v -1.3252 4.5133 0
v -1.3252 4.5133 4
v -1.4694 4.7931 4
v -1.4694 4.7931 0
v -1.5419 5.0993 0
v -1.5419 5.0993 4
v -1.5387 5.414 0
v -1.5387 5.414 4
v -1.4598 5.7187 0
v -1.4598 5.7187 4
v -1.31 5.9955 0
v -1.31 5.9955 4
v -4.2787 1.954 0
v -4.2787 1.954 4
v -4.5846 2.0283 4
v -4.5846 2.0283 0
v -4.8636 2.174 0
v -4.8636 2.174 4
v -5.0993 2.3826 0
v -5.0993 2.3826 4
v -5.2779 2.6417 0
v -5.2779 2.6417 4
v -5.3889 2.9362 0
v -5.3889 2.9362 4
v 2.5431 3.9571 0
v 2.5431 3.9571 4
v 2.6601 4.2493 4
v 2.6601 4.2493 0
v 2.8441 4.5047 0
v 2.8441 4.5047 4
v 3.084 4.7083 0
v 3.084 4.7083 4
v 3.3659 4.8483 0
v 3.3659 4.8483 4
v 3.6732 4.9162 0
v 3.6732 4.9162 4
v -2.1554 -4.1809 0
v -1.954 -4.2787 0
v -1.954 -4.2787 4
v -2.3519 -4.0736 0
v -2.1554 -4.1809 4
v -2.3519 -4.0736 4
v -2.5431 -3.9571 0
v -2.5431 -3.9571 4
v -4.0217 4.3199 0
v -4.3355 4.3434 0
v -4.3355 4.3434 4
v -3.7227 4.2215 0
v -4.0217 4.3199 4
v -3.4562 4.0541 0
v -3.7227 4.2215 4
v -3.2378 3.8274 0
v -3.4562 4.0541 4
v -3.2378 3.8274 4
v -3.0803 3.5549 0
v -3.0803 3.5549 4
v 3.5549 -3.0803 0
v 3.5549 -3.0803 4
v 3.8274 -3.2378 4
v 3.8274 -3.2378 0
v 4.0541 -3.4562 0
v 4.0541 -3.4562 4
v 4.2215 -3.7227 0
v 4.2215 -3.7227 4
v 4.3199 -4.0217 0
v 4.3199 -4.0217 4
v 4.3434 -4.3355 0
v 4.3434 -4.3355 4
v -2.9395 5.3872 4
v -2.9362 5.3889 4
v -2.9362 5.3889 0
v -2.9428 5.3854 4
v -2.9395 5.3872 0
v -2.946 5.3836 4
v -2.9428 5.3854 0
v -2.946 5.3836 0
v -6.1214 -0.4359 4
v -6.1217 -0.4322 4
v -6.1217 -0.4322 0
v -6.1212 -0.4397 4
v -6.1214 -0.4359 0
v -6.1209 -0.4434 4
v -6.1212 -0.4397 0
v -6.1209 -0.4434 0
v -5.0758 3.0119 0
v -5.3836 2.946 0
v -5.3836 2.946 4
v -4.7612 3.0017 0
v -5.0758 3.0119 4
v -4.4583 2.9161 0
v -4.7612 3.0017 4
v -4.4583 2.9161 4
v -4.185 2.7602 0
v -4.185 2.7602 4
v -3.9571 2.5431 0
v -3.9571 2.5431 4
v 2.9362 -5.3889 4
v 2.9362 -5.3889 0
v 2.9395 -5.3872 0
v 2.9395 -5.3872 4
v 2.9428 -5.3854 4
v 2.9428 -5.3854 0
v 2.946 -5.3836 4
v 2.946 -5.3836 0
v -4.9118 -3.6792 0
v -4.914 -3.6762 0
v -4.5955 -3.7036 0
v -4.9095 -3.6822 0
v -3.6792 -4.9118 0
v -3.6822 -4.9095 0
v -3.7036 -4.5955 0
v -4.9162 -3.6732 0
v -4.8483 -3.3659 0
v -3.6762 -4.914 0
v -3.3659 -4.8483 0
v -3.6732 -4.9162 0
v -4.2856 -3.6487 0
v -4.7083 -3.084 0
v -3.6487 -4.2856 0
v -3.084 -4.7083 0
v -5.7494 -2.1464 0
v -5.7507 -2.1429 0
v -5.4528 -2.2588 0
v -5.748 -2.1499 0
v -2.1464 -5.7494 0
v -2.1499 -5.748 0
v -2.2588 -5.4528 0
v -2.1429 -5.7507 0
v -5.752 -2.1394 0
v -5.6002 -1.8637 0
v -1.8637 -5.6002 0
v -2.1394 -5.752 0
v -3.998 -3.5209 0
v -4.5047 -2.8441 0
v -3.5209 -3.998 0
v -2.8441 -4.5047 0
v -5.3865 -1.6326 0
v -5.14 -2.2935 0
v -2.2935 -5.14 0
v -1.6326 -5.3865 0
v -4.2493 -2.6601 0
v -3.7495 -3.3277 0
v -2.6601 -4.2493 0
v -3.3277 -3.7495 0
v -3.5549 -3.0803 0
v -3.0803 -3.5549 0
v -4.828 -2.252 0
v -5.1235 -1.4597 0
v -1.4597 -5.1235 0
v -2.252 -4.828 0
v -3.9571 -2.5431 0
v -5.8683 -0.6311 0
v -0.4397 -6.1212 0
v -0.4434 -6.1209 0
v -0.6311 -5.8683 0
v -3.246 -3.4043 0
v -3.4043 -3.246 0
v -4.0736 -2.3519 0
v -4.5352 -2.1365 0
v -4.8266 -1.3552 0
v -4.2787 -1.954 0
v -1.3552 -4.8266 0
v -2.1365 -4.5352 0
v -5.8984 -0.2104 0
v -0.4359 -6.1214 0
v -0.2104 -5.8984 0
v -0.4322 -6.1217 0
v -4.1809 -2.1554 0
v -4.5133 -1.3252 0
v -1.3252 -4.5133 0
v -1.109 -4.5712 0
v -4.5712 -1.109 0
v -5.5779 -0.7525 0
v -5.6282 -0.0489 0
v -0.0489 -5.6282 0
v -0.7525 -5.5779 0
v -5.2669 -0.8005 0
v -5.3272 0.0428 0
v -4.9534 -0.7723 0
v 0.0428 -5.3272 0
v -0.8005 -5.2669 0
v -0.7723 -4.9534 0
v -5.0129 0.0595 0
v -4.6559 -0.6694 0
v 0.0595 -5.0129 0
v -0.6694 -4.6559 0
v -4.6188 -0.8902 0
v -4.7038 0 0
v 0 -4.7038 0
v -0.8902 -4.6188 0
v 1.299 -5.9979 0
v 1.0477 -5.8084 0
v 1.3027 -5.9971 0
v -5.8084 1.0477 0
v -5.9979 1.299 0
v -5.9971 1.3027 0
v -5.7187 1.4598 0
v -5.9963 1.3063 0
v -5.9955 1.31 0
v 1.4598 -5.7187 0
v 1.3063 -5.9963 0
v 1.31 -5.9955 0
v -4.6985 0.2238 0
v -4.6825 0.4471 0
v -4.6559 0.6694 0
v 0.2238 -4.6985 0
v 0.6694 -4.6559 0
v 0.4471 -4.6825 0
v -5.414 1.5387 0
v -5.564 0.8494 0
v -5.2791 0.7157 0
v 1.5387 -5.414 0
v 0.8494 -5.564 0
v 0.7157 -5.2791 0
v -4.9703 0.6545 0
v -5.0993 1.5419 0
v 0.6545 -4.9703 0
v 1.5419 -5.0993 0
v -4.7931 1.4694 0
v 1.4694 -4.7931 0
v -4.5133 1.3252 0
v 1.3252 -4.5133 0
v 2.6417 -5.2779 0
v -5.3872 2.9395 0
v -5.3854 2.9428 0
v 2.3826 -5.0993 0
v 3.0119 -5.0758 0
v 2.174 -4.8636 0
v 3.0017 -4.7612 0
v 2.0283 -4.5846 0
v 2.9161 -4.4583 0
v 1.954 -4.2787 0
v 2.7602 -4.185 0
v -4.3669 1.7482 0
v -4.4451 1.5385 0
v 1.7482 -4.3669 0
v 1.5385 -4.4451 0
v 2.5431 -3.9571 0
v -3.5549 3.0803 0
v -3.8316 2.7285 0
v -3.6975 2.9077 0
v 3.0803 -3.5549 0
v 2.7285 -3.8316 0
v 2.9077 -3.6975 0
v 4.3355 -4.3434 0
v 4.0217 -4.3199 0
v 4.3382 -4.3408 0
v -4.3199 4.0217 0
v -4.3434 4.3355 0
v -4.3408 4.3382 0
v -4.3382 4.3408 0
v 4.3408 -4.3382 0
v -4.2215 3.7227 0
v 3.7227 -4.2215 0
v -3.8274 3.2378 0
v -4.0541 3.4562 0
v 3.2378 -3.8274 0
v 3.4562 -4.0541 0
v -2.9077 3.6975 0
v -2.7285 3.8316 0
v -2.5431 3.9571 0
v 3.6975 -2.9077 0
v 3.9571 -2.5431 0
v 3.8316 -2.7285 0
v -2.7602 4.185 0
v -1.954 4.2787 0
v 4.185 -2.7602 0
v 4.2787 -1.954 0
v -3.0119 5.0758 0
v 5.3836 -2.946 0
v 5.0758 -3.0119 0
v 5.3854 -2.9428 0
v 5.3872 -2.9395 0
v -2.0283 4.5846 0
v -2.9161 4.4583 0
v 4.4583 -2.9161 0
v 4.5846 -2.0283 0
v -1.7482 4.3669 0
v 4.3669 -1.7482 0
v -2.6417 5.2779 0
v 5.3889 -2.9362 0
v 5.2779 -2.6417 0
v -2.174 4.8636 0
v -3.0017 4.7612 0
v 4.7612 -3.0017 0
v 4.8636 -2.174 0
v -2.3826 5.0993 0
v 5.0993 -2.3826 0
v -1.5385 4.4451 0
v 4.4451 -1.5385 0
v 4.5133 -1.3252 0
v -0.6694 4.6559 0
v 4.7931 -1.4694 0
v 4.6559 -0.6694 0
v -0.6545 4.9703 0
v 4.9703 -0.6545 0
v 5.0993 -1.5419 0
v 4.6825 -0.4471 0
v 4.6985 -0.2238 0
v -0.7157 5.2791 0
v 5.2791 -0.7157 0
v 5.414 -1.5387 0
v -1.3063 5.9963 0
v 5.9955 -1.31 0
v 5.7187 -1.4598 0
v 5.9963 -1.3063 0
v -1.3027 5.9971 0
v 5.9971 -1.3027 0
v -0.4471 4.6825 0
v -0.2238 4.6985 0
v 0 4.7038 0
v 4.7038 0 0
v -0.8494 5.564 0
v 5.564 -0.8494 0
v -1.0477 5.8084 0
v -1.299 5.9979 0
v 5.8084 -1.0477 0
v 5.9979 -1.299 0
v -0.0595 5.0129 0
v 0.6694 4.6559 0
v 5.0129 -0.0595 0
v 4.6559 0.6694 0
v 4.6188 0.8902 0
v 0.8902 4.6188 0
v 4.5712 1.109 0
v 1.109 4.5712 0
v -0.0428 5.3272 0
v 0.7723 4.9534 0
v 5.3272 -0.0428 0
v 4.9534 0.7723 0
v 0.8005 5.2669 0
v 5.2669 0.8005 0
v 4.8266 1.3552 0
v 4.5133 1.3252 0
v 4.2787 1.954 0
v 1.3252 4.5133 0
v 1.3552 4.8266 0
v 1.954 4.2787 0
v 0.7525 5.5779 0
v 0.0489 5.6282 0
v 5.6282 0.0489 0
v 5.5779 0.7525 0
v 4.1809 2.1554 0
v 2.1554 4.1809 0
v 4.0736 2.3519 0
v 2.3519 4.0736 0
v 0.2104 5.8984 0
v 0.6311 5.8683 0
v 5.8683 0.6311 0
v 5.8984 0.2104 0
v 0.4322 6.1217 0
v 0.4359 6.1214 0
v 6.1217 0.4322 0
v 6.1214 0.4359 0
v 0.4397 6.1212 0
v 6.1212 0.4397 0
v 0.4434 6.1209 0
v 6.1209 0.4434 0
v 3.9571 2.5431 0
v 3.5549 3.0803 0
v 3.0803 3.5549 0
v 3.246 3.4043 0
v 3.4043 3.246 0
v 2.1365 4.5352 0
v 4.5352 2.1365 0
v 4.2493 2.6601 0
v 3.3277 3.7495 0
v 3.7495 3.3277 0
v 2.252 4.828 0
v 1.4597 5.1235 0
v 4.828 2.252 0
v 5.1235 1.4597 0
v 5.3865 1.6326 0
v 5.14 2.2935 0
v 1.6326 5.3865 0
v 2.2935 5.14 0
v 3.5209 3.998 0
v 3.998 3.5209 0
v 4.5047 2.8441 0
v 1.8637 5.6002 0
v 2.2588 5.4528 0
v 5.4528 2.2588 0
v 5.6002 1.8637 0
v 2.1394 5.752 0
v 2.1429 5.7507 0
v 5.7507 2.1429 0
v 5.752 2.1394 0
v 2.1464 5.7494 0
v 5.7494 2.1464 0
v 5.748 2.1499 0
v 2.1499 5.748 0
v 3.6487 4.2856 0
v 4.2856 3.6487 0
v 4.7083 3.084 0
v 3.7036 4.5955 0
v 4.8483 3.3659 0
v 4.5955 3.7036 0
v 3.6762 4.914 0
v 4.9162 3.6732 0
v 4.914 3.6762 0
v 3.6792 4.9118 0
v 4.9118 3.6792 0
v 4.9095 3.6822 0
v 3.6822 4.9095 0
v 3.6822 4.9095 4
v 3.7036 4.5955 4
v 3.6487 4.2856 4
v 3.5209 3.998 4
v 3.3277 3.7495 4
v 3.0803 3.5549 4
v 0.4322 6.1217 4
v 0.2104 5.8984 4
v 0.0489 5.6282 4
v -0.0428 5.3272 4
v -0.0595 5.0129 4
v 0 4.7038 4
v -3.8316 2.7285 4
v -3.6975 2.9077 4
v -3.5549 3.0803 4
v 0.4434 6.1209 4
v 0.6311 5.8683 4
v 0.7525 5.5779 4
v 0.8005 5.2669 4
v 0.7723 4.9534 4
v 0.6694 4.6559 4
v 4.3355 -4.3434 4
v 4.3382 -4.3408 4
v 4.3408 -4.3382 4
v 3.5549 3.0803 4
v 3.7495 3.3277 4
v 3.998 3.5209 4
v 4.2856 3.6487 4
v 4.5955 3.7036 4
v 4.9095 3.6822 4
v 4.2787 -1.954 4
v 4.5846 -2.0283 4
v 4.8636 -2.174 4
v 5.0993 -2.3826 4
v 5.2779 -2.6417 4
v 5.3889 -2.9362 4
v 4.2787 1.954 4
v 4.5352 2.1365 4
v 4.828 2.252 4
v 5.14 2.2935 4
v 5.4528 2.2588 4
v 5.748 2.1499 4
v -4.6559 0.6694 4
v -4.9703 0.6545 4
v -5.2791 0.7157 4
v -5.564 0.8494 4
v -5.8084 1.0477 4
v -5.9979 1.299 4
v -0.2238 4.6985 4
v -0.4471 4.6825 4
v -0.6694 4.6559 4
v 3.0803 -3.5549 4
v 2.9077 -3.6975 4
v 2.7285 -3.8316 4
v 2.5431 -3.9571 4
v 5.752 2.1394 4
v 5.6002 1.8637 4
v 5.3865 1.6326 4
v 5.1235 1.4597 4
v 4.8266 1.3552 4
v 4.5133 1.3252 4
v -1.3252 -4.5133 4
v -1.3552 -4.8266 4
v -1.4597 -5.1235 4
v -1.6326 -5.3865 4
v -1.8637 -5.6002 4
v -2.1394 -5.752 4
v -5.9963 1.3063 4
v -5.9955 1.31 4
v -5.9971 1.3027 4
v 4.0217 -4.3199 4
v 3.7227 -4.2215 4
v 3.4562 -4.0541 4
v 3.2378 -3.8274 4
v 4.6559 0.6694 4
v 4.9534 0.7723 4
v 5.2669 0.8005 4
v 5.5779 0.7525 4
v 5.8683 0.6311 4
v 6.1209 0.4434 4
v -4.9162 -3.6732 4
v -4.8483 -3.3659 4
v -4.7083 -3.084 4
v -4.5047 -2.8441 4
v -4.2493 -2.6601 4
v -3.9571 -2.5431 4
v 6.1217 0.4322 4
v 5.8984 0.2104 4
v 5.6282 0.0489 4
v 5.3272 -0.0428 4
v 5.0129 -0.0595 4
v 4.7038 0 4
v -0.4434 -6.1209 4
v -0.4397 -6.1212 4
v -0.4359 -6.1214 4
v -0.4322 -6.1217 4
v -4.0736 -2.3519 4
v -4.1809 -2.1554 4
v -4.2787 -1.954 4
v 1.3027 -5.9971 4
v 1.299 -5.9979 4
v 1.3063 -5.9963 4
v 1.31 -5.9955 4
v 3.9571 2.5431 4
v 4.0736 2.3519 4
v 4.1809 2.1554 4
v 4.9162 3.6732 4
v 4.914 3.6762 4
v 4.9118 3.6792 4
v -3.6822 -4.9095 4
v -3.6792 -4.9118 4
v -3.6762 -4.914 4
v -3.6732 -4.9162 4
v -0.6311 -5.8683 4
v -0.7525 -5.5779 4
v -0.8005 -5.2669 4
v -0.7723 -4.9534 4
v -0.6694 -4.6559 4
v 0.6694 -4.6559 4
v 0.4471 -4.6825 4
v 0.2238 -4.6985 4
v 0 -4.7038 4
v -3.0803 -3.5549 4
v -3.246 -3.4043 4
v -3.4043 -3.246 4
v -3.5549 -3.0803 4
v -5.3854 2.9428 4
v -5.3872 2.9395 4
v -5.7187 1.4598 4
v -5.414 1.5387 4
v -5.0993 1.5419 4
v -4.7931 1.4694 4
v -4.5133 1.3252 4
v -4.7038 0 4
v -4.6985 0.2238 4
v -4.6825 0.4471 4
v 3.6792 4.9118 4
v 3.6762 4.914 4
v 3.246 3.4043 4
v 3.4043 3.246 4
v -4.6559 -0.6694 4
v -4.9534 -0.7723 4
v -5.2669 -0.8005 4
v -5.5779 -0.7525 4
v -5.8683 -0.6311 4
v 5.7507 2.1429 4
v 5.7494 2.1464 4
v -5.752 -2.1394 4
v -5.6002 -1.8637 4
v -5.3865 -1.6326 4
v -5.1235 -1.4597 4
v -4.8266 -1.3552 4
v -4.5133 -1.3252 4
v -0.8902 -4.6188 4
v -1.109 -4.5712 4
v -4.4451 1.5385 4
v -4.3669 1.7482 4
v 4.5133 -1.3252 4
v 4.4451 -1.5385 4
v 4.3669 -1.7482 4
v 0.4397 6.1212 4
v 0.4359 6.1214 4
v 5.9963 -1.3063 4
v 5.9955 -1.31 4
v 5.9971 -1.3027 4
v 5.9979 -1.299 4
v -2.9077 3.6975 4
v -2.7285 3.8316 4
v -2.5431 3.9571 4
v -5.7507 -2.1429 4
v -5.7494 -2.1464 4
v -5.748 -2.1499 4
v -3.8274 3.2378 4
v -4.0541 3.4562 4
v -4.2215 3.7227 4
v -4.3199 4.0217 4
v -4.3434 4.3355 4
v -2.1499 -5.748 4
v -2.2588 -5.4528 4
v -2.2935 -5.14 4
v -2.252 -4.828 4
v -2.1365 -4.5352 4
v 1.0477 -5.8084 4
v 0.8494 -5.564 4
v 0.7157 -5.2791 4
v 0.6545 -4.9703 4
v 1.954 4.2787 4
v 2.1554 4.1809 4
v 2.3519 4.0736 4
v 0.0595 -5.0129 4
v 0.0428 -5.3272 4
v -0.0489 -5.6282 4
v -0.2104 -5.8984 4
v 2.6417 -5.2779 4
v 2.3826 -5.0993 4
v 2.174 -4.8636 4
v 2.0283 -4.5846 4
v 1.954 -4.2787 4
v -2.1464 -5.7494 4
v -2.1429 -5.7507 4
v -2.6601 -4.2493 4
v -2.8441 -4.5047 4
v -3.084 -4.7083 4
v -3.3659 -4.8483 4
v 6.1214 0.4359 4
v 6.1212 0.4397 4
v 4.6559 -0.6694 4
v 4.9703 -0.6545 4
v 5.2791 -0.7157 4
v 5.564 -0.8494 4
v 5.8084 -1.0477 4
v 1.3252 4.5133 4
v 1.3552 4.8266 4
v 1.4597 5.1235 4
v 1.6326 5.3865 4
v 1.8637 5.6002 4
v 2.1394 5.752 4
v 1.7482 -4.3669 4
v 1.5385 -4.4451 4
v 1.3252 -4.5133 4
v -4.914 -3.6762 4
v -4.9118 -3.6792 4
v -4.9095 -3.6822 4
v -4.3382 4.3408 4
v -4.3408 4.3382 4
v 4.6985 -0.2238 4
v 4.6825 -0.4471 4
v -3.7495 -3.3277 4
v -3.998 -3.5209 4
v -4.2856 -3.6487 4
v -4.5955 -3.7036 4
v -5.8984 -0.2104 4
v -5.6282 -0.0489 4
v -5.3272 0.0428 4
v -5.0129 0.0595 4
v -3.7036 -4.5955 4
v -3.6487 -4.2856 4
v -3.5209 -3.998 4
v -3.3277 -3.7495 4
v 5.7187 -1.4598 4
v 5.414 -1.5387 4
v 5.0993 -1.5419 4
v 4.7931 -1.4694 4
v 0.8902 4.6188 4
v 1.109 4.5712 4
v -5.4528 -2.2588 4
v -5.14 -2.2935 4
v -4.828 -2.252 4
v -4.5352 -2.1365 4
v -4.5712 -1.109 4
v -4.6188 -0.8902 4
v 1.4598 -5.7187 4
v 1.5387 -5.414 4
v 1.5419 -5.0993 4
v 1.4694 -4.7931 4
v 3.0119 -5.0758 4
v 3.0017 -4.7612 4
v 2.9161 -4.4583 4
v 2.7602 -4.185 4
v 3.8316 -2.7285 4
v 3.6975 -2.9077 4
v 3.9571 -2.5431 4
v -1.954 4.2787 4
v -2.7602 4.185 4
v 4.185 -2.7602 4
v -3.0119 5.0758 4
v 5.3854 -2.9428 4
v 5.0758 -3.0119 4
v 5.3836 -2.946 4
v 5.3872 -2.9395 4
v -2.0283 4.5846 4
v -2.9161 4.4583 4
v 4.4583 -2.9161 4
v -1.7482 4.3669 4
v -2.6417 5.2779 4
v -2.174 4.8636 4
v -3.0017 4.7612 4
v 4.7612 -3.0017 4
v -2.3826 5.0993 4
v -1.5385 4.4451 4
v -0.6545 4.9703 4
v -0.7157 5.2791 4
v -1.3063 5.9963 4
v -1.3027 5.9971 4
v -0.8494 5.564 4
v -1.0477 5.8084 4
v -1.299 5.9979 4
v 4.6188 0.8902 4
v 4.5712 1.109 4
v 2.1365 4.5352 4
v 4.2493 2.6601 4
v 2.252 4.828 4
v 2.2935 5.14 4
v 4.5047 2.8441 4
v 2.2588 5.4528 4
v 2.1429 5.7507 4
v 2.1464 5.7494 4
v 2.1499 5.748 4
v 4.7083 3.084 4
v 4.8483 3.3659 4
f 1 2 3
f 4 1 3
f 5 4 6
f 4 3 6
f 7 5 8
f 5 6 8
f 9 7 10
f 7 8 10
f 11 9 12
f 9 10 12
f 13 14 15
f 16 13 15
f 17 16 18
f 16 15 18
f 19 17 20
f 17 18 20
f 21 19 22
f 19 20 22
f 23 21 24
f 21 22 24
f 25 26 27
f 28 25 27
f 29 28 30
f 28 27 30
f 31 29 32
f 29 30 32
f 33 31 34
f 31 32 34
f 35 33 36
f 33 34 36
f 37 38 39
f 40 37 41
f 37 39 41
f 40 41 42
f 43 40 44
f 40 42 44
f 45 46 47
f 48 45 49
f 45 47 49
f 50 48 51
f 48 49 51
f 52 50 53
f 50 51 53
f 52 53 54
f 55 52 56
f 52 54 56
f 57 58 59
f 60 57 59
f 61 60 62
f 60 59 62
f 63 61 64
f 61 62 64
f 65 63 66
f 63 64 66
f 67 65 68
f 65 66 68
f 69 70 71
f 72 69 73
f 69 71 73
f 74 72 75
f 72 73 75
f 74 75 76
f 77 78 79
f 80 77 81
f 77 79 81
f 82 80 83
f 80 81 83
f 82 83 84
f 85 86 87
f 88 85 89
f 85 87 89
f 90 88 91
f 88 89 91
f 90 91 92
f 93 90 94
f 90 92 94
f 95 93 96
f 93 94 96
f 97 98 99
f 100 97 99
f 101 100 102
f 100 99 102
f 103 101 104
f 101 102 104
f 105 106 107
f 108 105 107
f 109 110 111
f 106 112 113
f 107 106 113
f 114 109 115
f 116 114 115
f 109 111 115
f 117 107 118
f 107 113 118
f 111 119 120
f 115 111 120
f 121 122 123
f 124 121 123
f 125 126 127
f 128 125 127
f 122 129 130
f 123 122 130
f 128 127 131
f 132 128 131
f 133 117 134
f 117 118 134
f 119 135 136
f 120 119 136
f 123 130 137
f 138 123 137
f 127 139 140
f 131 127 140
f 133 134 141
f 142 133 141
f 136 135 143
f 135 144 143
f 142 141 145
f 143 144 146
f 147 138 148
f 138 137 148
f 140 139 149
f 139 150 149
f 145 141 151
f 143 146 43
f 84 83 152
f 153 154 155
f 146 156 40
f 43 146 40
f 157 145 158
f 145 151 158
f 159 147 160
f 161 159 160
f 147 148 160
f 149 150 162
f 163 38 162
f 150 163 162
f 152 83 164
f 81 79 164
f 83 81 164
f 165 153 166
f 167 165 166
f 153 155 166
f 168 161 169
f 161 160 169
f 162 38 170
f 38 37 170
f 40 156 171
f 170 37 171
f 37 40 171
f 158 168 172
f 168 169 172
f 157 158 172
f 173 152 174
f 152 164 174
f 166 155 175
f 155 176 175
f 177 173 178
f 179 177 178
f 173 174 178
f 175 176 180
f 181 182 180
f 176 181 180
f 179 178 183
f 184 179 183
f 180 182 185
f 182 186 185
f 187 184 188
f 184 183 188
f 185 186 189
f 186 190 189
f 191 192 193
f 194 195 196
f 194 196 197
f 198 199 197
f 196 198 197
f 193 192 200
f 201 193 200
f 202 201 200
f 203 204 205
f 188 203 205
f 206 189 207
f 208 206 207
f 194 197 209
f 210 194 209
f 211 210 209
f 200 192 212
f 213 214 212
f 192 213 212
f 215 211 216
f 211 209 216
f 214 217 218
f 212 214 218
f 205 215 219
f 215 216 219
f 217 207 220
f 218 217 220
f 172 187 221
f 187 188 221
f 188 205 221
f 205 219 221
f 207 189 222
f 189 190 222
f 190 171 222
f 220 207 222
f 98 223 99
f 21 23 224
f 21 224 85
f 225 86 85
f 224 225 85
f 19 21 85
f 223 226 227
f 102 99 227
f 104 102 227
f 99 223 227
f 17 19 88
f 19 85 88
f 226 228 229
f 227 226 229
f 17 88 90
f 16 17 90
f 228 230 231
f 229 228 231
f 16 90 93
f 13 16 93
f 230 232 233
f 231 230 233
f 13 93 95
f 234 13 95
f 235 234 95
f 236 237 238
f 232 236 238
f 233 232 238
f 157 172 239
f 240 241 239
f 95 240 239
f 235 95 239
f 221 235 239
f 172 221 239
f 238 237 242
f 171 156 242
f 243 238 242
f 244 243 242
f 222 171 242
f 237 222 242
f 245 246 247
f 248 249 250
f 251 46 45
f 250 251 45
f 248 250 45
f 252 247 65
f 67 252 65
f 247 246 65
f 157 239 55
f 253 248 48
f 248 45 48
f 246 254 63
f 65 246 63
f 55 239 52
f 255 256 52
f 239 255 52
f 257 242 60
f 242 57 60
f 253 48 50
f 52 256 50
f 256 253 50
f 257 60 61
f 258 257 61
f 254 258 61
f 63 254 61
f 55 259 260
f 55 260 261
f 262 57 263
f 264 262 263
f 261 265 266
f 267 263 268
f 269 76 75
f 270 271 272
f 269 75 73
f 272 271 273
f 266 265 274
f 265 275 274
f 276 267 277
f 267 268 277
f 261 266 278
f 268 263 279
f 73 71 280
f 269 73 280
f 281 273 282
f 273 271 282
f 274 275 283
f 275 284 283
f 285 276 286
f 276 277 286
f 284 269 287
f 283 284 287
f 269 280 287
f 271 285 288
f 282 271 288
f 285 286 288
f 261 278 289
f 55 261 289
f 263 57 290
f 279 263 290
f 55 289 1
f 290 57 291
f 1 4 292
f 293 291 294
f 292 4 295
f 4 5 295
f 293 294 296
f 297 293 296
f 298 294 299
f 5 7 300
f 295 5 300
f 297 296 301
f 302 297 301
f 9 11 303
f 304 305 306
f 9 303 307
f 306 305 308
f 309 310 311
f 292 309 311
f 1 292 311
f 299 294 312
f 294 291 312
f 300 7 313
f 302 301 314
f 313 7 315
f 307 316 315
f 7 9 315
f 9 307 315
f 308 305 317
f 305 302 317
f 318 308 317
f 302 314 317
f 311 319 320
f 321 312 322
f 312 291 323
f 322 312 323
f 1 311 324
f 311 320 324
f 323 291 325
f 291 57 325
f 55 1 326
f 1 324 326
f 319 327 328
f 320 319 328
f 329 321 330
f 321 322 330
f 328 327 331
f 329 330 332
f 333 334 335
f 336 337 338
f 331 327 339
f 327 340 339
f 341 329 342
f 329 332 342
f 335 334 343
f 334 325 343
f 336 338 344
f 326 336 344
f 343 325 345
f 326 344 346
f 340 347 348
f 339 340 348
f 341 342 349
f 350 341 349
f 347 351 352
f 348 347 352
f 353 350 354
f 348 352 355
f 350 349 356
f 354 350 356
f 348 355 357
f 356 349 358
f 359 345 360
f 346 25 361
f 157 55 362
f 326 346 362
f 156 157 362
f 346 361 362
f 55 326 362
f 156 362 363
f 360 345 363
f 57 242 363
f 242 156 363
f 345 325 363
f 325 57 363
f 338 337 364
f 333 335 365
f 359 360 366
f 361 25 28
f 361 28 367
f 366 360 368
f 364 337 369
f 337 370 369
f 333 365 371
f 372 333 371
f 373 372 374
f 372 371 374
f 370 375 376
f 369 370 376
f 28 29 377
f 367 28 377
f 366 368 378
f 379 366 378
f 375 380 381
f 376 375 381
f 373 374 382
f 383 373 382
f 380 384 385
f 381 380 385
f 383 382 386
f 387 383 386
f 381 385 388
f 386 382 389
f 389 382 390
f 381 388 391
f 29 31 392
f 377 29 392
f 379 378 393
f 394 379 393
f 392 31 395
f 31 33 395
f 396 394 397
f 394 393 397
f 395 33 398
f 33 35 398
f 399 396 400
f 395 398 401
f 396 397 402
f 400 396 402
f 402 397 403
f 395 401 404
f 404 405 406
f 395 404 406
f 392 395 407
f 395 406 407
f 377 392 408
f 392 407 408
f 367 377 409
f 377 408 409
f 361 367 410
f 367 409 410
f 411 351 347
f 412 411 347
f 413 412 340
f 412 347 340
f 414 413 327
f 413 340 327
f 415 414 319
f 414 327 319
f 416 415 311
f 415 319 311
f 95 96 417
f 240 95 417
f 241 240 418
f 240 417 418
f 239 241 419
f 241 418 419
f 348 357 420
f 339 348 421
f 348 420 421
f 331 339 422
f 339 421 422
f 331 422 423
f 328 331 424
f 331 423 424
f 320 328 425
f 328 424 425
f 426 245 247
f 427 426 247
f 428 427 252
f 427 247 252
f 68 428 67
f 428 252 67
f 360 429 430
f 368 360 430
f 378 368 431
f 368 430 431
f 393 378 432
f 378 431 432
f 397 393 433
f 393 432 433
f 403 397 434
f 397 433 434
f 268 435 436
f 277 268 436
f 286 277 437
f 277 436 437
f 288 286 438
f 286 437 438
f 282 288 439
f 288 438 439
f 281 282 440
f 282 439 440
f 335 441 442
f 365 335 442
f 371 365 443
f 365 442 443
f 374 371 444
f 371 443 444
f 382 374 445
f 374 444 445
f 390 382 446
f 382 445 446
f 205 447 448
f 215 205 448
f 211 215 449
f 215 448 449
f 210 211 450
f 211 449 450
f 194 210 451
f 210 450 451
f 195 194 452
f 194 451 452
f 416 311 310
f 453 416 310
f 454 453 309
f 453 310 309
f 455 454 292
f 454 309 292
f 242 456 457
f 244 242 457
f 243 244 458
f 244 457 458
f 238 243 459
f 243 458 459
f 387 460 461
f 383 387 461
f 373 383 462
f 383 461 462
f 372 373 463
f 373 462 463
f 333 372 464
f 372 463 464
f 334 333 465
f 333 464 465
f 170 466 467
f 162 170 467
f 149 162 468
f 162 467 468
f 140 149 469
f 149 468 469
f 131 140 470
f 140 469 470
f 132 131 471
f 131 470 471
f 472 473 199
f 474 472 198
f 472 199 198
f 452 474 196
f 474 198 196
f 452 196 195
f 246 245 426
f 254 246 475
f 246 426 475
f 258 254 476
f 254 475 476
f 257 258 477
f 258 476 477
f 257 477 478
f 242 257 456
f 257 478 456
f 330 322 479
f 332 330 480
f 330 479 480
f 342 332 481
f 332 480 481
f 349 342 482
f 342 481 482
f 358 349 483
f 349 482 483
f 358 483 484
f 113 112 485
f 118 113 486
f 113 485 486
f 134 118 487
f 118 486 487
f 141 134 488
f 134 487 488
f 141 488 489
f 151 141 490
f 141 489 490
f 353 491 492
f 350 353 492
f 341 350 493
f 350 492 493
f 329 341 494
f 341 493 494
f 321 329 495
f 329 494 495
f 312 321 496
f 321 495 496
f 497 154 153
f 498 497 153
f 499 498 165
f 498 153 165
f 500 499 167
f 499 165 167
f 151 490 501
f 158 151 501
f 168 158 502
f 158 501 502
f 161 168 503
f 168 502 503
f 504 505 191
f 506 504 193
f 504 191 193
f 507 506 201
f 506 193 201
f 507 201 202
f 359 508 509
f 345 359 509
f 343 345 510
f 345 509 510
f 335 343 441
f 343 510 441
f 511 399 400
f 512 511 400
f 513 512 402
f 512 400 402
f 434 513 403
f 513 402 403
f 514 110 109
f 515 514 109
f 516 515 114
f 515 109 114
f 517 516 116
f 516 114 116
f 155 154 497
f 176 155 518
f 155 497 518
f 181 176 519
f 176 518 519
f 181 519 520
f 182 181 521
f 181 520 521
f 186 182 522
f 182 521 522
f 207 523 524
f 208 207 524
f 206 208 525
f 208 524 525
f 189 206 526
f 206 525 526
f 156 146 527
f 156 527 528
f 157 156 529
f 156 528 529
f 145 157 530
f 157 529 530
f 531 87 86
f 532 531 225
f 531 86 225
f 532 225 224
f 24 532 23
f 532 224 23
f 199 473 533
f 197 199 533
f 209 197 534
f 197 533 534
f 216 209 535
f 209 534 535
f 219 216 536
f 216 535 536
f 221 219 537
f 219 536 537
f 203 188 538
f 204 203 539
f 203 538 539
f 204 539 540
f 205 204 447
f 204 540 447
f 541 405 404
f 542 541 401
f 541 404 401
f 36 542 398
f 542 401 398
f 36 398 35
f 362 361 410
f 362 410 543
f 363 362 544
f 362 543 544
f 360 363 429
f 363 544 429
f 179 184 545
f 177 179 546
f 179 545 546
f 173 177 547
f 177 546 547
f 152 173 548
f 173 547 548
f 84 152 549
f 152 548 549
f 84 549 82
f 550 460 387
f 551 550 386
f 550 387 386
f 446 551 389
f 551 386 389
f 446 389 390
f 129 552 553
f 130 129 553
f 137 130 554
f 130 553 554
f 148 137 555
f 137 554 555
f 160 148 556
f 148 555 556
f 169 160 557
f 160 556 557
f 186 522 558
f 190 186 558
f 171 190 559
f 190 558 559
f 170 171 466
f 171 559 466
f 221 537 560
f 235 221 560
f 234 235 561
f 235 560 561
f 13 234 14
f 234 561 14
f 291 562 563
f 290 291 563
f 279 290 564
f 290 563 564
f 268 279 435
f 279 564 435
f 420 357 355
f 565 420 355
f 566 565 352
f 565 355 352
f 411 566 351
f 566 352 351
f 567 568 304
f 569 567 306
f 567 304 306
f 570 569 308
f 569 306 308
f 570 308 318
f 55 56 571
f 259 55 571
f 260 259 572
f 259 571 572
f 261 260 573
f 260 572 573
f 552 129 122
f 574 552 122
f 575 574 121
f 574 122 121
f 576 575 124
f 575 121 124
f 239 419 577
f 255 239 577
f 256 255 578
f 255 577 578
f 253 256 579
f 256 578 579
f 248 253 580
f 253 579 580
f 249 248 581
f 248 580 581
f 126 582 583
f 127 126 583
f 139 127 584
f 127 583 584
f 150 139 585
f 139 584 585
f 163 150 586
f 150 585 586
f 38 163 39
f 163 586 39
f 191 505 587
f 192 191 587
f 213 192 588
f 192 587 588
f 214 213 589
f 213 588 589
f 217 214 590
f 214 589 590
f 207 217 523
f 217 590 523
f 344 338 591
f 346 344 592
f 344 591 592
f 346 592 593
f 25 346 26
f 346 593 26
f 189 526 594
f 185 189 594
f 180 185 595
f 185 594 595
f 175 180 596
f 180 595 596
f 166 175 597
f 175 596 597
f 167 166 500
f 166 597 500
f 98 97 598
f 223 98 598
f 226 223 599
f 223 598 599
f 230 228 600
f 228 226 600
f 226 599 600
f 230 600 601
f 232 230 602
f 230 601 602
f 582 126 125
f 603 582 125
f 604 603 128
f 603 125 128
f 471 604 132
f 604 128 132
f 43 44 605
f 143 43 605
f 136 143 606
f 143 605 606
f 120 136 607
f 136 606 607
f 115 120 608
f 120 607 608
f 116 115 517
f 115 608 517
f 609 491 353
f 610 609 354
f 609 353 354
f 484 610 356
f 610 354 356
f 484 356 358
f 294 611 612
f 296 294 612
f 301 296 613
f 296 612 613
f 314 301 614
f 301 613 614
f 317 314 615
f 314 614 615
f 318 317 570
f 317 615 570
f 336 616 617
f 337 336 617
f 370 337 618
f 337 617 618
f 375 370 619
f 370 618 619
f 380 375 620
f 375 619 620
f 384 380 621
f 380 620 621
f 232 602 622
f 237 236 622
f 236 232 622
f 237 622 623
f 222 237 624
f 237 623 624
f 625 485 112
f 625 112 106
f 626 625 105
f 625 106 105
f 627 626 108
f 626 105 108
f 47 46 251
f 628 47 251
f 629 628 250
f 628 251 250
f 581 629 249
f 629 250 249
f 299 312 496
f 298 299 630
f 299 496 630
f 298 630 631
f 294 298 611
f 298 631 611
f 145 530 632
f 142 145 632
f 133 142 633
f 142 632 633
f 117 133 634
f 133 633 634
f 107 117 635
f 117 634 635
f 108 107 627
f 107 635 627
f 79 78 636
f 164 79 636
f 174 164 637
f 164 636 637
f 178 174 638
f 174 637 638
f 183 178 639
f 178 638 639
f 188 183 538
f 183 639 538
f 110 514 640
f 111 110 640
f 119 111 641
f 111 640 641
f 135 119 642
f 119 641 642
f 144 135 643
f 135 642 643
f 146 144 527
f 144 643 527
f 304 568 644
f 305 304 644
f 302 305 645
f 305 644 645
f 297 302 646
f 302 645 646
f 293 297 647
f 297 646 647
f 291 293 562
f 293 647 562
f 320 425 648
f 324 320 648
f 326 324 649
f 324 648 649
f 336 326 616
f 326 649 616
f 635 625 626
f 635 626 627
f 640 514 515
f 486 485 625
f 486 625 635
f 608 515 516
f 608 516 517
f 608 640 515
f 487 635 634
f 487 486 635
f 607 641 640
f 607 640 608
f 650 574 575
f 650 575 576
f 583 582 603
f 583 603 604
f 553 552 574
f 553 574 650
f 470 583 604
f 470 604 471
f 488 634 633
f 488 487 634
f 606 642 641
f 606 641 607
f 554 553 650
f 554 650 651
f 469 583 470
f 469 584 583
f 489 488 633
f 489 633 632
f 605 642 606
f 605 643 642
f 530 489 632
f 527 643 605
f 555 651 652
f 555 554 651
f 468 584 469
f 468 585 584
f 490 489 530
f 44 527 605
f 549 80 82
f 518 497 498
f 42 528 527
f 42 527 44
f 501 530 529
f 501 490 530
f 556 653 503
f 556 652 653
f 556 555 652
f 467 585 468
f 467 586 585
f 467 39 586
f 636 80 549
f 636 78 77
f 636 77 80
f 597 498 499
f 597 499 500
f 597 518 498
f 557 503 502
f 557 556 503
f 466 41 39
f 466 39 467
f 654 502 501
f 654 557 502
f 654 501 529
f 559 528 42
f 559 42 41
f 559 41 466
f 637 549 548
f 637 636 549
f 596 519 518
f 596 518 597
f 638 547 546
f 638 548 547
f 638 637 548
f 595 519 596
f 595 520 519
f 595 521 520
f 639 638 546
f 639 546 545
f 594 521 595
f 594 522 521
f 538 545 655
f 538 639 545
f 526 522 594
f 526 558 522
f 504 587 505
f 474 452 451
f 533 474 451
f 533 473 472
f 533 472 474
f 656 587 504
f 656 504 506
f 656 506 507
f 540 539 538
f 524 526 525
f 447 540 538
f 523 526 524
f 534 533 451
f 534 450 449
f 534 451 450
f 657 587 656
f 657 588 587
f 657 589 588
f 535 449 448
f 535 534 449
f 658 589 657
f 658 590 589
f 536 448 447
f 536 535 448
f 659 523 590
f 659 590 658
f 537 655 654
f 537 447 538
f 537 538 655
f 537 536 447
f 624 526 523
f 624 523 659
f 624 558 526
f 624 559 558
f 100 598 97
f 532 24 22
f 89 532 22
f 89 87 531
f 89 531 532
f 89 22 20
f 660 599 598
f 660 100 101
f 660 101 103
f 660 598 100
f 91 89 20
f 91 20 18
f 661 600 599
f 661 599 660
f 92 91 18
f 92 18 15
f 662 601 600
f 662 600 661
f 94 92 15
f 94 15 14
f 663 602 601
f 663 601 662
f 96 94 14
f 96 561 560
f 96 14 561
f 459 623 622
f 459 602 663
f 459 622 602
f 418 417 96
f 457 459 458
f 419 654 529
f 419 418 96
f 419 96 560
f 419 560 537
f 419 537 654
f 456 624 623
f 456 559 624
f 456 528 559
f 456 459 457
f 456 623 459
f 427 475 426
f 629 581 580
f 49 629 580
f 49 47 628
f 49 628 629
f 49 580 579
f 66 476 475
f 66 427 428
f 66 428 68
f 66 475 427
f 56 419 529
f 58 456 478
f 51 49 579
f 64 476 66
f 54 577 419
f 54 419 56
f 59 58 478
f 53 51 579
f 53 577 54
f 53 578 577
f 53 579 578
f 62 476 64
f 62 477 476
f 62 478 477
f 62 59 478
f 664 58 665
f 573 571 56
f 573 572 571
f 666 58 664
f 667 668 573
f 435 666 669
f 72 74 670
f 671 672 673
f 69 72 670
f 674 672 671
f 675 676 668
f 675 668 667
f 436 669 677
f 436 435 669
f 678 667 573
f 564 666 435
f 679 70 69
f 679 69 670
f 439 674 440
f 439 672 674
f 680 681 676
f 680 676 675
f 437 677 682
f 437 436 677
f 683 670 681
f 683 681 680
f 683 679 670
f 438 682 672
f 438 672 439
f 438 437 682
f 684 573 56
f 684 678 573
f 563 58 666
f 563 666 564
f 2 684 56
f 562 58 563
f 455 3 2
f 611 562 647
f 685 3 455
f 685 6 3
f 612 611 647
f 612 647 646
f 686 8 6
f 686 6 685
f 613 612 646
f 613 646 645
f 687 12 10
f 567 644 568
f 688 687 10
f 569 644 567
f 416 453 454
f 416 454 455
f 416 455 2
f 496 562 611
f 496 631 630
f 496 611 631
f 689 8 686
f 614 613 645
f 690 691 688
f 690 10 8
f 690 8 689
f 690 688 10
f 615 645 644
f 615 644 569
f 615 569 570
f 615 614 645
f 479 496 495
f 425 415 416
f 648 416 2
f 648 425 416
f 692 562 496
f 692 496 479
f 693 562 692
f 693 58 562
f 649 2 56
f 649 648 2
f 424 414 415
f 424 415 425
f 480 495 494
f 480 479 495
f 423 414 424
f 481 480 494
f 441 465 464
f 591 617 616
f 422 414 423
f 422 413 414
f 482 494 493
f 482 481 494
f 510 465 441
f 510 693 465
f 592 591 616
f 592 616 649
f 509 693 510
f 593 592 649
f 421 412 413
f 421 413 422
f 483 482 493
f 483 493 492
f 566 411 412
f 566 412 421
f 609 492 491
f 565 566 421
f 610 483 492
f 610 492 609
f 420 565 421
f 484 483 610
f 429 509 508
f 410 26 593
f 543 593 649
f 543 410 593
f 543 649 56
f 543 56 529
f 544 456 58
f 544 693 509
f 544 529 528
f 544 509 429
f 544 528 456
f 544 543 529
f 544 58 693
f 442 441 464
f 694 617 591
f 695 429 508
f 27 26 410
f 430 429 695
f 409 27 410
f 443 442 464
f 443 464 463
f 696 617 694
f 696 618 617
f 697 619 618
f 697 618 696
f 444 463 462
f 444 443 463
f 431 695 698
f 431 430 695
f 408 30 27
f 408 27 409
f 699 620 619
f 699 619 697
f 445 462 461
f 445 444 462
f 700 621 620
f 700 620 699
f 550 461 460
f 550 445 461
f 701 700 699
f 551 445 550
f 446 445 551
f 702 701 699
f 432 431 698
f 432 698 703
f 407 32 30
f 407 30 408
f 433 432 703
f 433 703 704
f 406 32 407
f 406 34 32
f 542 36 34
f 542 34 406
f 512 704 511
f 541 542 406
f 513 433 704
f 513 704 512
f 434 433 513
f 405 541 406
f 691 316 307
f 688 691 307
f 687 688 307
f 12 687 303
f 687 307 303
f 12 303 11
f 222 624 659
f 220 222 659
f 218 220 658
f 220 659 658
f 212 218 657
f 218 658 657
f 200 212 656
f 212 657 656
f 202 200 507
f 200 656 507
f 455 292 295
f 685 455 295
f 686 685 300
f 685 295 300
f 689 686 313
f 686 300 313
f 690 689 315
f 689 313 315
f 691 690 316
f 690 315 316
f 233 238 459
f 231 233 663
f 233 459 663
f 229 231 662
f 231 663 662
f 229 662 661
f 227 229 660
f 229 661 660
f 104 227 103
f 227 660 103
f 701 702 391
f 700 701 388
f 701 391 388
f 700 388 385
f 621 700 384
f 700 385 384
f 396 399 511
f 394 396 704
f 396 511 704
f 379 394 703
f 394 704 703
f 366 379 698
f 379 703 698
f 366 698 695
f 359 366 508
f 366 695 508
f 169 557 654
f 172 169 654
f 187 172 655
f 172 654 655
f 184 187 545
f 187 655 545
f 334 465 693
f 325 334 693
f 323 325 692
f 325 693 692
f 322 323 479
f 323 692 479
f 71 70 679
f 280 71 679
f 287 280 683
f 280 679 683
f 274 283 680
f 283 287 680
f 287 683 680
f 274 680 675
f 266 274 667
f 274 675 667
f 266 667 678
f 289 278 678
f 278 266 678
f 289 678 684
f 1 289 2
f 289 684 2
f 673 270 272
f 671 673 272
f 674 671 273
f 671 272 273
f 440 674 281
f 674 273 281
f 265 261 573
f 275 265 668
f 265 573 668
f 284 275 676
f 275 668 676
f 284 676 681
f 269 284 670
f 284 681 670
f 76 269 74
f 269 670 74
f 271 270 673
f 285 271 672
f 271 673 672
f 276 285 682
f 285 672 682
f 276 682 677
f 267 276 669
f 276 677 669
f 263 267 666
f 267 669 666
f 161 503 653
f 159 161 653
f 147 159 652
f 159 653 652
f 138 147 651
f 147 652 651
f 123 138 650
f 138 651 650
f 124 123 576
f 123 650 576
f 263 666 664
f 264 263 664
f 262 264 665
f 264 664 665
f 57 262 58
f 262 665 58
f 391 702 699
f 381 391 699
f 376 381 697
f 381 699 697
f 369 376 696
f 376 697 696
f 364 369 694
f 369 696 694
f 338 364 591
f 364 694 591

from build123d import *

# Parameters (mm, degrees)
BOSS_EXTRUDE1_DEPTH = 4
CUT_EXTRUDE1_DEPTH  = 10


with BuildPart() as part:
    # Sketch1 → Boss-Extrude1 (new body)
    with BuildSketch(Plane.XY):
        with BuildLine():
            ThreePointArc((0.432215106, 6.121703644), (-0.006111672, 5.480502071), (0, 4.703821656))
            ThreePointArc((0, 4.703821656), (-0.335566795, 4.691836858), (-0.669423618, 4.655943534))
            ThreePointArc((-0.669423618, 4.655943534), (-0.773907302, 5.425588244), (-1.299025043, 5.997882904))
            ThreePointArc((-1.299025043, 5.997882904), (0.437804478, -6.121306449), (0.432215106, 6.121703644))
        make_face()
    extrude(amount=BOSS_EXTRUDE1_DEPTH)

    # Sketch2 → Cut-Extrude1 (cut)
    with BuildSketch(Plane.XY.offset(4)):
        with BuildLine():
            ThreePointArc((-3.554911214, 3.080348102), (-4.145889401, 3.584346716), (-4.343434222, 4.335509723))
            ThreePointArc((-4.343434222, 4.335509723), (-4.912875705, 3.677732686), (-5.383577945, 2.946040378))
            ThreePointArc((-5.383577945, 2.946040378), (-4.60718751, 2.968124585), (-3.957106586, 2.543077985))
            ThreePointArc((-3.957106586, 2.543077985), (-3.765603226, 2.818895266), (-3.554911214, 3.080348102))
        make_face()
        with BuildLine():
            ThreePointArc((-2.543077985, 3.957106586), (-2.968124585, 4.60718751), (-2.946040378, 5.383577945))
            ThreePointArc((-2.946040378, 5.383577945), (-3.677732686, 4.912875705), (-4.335509723, 4.343434222))
            ThreePointArc((-4.335509723, 4.343434222), (-3.584346716, 4.145889401), (-3.080348102, 3.554911214))
            ThreePointArc((-3.080348102, 3.554911214), (-2.818895266, 3.765603226), (-2.543077985, 3.957106586))
        make_face()
        with BuildLine():
            ThreePointArc((-1.325219702, 4.513283828), (-1.549899967, 5.256781372), (-1.309975863, 5.995500699))
            ThreePointArc((-1.309975863, 5.995500699), (-2.144641637, 5.750006752), (-2.936204288, 5.388948857))
            ThreePointArc((-2.936204288, 5.388948857), (-2.271123467, 4.987778915), (-1.954038134, 4.278746679))
            ThreePointArc((-1.954038134, 4.278746679), (-1.643817176, 4.407244407), (-1.325219702, 4.513283828))
        make_face()
        with BuildLine():
            ThreePointArc((2.139390577, 5.751962566), (1.304500997, 5.996694302), (0.443393485, 6.12090415))
            ThreePointArc((0.443393485, 6.12090415), (0.78600623, 5.423848681), (0.669423618, 4.655943534))
            ThreePointArc((0.669423618, 4.655943534), (0.999869212, 4.596324589), (1.325219702, 4.513283828))
            ThreePointArc((1.325219702, 4.513283828), (1.538171755, 5.260225086), (2.139390577, 5.751962566))
        make_face()
        with BuildLine():
            ThreePointArc((3.673245347, 4.916231689), (2.941123559, 5.386265646), (2.14989091, 5.748046144))
            ThreePointArc((2.14989091, 5.748046144), (2.282242211, 4.982701155), (1.954038134, 4.278746679))
            ThreePointArc((1.954038134, 4.278746679), (2.254301762, 4.128445438), (2.543077985, 3.957106586))
            ThreePointArc((2.543077985, 3.957106586), (2.957841655, 4.613795948), (3.673245347, 4.916231689))
        make_face()
        with BuildLine():
            ThreePointArc((4.909515624, 3.682216959), (4.339473781, 4.339473781), (3.682216959, 4.909515624))
            ThreePointArc((3.682216959, 4.909515624), (3.593584502, 4.137884814), (3.080348102, 3.554911214))
            ThreePointArc((3.080348102, 3.554911214), (3.32610419, 3.32610419), (3.554911214, 3.080348102))
            ThreePointArc((3.554911214, 3.080348102), (4.137884814, 3.593584502), (4.909515624, 3.682216959))
        make_face()
        with BuildLine():
            ThreePointArc((5.748046144, 2.14989091), (5.386265646, 2.941123559), (4.916231689, 3.673245347))
            ThreePointArc((4.916231689, 3.673245347), (4.613795948, 2.957841655), (3.957106586, 2.543077985))
            ThreePointArc((3.957106586, 2.543077985), (4.128445438, 2.254301762), (4.278746679, 1.954038134))
            ThreePointArc((4.278746679, 1.954038134), (4.982701155, 2.282242211), (5.748046144, 2.14989091))
        make_face()
        with BuildLine():
            ThreePointArc((6.12090415, 0.443393485), (5.996694302, 1.304500997), (5.751962566, 2.139390577))
            ThreePointArc((5.751962566, 2.139390577), (5.260225086, 1.538171755), (4.513283828, 1.325219702))
            ThreePointArc((4.513283828, 1.325219702), (4.596324589, 0.999869212), (4.655943534, 0.669423618))
            ThreePointArc((4.655943534, 0.669423618), (5.423848681, 0.78600623), (6.12090415, 0.443393485))
        make_face()
        with BuildLine():
            ThreePointArc((5.997882904, -1.299025043), (6.121306449, -0.437804478), (6.121703644, 0.432215106))
            ThreePointArc((6.121703644, 0.432215106), (5.480502071, -0.006111672), (4.703821656, 0))
            ThreePointArc((4.703821656, 0), (4.691836858, -0.335566795), (4.655943534, -0.669423618))
            ThreePointArc((4.655943534, -0.669423618), (5.425588244, -0.773907302), (5.997882904, -1.299025043))
        make_face()
        with BuildLine():
            ThreePointArc((5.388948857, -2.936204288), (5.750006752, -2.144641637), (5.995500699, -1.309975863))
            ThreePointArc((5.995500699, -1.309975863), (5.256781372, -1.549899967), (4.513283828, -1.325219702))
            ThreePointArc((4.513283828, -1.325219702), (4.407244407, -1.643817176), (4.278746679, -1.954038134))
            ThreePointArc((4.278746679, -1.954038134), (4.987778915, -2.271123467), (5.388948857, -2.936204288))
        make_face()
        with BuildLine():
            ThreePointArc((4.343434222, -4.335509723), (4.912875705, -3.677732686), (5.383577945, -2.946040378))
            ThreePointArc((5.383577945, -2.946040378), (4.60718751, -2.968124585), (3.957106586, -2.543077985))
            ThreePointArc((3.957106586, -2.543077985), (3.765603226, -2.818895266), (3.554911214, -3.080348102))
            ThreePointArc((3.554911214, -3.080348102), (4.145889401, -3.584346716), (4.343434222, -4.335509723))
        make_face()
        with BuildLine():
            ThreePointArc((2.946040378, -5.383577945), (3.677732686, -4.912875705), (4.335509723, -4.343434222))
            ThreePointArc((4.335509723, -4.343434222), (3.584346716, -4.145889401), (3.080348102, -3.554911214))
            ThreePointArc((3.080348102, -3.554911214), (2.818895266, -3.765603226), (2.543077985, -3.957106586))
            ThreePointArc((2.543077985, -3.957106586), (2.968124585, -4.60718751), (2.946040378, -5.383577945))
        make_face()
        with BuildLine():
            ThreePointArc((1.309975863, -5.995500699), (2.144641637, -5.750006752), (2.936204288, -5.388948857))
            ThreePointArc((2.936204288, -5.388948857), (2.271123467, -4.987778915), (1.954038134, -4.278746679))
            ThreePointArc((1.954038134, -4.278746679), (1.643817176, -4.407244407), (1.325219702, -4.513283828))
            ThreePointArc((1.325219702, -4.513283828), (1.549899967, -5.256781372), (1.309975863, -5.995500699))
        make_face()
        with BuildLine():
            ThreePointArc((0, -4.703821656), (0.006111672, -5.480502071), (-0.432215106, -6.121703644))
            ThreePointArc((-0.432215106, -6.121703644), (0.437804478, -6.121306449), (1.299025043, -5.997882904))
            ThreePointArc((1.299025043, -5.997882904), (0.773907302, -5.425588244), (0.669423618, -4.655943534))
            ThreePointArc((0.669423618, -4.655943534), (0.335566795, -4.691836858), (0, -4.703821656))
        make_face()
        with BuildLine():
            ThreePointArc((-1.325219702, -4.513283828), (-1.538171755, -5.260225086), (-2.139390577, -5.751962566))
            ThreePointArc((-2.139390577, -5.751962566), (-1.304500997, -5.996694302), (-0.443393485, -6.12090415))
            ThreePointArc((-0.443393485, -6.12090415), (-0.78600623, -5.423848681), (-0.669423618, -4.655943534))
            ThreePointArc((-0.669423618, -4.655943534), (-0.999869212, -4.596324589), (-1.325219702, -4.513283828))
        make_face()
        with BuildLine():
            ThreePointArc((-2.543077985, -3.957106586), (-2.957841655, -4.613795948), (-3.673245347, -4.916231689))
            ThreePointArc((-3.673245347, -4.916231689), (-2.941123559, -5.386265646), (-2.14989091, -5.748046144))
            ThreePointArc((-2.14989091, -5.748046144), (-2.282242211, -4.982701155), (-1.954038134, -4.278746679))
            ThreePointArc((-1.954038134, -4.278746679), (-2.254301762, -4.128445438), (-2.543077985, -3.957106586))
        make_face()
        with BuildLine():
            ThreePointArc((-3.554911214, -3.080348102), (-4.137884814, -3.593584502), (-4.909515624, -3.682216959))
            ThreePointArc((-4.909515624, -3.682216959), (-4.339473781, -4.339473781), (-3.682216959, -4.909515624))
            ThreePointArc((-3.682216959, -4.909515624), (-3.593584502, -4.137884814), (-3.080348102, -3.554911214))
            ThreePointArc((-3.080348102, -3.554911214), (-3.32610419, -3.32610419), (-3.554911214, -3.080348102))
        make_face()
        with BuildLine():
            ThreePointArc((-4.278746679, -1.954038134), (-4.982701155, -2.282242211), (-5.748046144, -2.14989091))
            ThreePointArc((-5.748046144, -2.14989091), (-5.386265646, -2.941123559), (-4.916231689, -3.673245347))
            ThreePointArc((-4.916231689, -3.673245347), (-4.613795948, -2.957841655), (-3.957106586, -2.543077985))
            ThreePointArc((-3.957106586, -2.543077985), (-4.128445438, -2.254301762), (-4.278746679, -1.954038134))
        make_face()
        with BuildLine():
            ThreePointArc((-4.655943534, -0.669423618), (-5.423848681, -0.78600623), (-6.12090415, -0.443393485))
            ThreePointArc((-6.12090415, -0.443393485), (-5.996694302, -1.304500997), (-5.751962566, -2.139390577))
            ThreePointArc((-5.751962566, -2.139390577), (-5.260225086, -1.538171755), (-4.513283828, -1.325219702))
            ThreePointArc((-4.513283828, -1.325219702), (-4.596324589, -0.999869212), (-4.655943534, -0.669423618))
        make_face()
        with BuildLine():
            ThreePointArc((-4.655943534, 0.669423618), (-5.425588244, 0.773907302), (-5.997882904, 1.299025043))
            ThreePointArc((-5.997882904, 1.299025043), (-6.121306449, 0.437804478), (-6.121703644, -0.432215106))
            ThreePointArc((-6.121703644, -0.432215106), (-5.480502071, 0.006111672), (-4.703821656, 0))
            ThreePointArc((-4.703821656, 0), (-4.691836858, 0.335566795), (-4.655943534, 0.669423618))
        make_face()
        with BuildLine():
            ThreePointArc((-4.278746679, 1.954038134), (-4.987778915, 2.271123467), (-5.388948857, 2.936204288))
            ThreePointArc((-5.388948857, 2.936204288), (-5.750006752, 2.144641637), (-5.995500699, 1.309975863))
            ThreePointArc((-5.995500699, 1.309975863), (-5.256781372, 1.549899967), (-4.513283828, 1.325219702))
            ThreePointArc((-4.513283828, 1.325219702), (-4.407244407, 1.643817176), (-4.278746679, 1.954038134))
        make_face()
    extrude(amount=-CUT_EXTRUDE1_DEPTH, mode=Mode.SUBTRACT)


solid = part.part
